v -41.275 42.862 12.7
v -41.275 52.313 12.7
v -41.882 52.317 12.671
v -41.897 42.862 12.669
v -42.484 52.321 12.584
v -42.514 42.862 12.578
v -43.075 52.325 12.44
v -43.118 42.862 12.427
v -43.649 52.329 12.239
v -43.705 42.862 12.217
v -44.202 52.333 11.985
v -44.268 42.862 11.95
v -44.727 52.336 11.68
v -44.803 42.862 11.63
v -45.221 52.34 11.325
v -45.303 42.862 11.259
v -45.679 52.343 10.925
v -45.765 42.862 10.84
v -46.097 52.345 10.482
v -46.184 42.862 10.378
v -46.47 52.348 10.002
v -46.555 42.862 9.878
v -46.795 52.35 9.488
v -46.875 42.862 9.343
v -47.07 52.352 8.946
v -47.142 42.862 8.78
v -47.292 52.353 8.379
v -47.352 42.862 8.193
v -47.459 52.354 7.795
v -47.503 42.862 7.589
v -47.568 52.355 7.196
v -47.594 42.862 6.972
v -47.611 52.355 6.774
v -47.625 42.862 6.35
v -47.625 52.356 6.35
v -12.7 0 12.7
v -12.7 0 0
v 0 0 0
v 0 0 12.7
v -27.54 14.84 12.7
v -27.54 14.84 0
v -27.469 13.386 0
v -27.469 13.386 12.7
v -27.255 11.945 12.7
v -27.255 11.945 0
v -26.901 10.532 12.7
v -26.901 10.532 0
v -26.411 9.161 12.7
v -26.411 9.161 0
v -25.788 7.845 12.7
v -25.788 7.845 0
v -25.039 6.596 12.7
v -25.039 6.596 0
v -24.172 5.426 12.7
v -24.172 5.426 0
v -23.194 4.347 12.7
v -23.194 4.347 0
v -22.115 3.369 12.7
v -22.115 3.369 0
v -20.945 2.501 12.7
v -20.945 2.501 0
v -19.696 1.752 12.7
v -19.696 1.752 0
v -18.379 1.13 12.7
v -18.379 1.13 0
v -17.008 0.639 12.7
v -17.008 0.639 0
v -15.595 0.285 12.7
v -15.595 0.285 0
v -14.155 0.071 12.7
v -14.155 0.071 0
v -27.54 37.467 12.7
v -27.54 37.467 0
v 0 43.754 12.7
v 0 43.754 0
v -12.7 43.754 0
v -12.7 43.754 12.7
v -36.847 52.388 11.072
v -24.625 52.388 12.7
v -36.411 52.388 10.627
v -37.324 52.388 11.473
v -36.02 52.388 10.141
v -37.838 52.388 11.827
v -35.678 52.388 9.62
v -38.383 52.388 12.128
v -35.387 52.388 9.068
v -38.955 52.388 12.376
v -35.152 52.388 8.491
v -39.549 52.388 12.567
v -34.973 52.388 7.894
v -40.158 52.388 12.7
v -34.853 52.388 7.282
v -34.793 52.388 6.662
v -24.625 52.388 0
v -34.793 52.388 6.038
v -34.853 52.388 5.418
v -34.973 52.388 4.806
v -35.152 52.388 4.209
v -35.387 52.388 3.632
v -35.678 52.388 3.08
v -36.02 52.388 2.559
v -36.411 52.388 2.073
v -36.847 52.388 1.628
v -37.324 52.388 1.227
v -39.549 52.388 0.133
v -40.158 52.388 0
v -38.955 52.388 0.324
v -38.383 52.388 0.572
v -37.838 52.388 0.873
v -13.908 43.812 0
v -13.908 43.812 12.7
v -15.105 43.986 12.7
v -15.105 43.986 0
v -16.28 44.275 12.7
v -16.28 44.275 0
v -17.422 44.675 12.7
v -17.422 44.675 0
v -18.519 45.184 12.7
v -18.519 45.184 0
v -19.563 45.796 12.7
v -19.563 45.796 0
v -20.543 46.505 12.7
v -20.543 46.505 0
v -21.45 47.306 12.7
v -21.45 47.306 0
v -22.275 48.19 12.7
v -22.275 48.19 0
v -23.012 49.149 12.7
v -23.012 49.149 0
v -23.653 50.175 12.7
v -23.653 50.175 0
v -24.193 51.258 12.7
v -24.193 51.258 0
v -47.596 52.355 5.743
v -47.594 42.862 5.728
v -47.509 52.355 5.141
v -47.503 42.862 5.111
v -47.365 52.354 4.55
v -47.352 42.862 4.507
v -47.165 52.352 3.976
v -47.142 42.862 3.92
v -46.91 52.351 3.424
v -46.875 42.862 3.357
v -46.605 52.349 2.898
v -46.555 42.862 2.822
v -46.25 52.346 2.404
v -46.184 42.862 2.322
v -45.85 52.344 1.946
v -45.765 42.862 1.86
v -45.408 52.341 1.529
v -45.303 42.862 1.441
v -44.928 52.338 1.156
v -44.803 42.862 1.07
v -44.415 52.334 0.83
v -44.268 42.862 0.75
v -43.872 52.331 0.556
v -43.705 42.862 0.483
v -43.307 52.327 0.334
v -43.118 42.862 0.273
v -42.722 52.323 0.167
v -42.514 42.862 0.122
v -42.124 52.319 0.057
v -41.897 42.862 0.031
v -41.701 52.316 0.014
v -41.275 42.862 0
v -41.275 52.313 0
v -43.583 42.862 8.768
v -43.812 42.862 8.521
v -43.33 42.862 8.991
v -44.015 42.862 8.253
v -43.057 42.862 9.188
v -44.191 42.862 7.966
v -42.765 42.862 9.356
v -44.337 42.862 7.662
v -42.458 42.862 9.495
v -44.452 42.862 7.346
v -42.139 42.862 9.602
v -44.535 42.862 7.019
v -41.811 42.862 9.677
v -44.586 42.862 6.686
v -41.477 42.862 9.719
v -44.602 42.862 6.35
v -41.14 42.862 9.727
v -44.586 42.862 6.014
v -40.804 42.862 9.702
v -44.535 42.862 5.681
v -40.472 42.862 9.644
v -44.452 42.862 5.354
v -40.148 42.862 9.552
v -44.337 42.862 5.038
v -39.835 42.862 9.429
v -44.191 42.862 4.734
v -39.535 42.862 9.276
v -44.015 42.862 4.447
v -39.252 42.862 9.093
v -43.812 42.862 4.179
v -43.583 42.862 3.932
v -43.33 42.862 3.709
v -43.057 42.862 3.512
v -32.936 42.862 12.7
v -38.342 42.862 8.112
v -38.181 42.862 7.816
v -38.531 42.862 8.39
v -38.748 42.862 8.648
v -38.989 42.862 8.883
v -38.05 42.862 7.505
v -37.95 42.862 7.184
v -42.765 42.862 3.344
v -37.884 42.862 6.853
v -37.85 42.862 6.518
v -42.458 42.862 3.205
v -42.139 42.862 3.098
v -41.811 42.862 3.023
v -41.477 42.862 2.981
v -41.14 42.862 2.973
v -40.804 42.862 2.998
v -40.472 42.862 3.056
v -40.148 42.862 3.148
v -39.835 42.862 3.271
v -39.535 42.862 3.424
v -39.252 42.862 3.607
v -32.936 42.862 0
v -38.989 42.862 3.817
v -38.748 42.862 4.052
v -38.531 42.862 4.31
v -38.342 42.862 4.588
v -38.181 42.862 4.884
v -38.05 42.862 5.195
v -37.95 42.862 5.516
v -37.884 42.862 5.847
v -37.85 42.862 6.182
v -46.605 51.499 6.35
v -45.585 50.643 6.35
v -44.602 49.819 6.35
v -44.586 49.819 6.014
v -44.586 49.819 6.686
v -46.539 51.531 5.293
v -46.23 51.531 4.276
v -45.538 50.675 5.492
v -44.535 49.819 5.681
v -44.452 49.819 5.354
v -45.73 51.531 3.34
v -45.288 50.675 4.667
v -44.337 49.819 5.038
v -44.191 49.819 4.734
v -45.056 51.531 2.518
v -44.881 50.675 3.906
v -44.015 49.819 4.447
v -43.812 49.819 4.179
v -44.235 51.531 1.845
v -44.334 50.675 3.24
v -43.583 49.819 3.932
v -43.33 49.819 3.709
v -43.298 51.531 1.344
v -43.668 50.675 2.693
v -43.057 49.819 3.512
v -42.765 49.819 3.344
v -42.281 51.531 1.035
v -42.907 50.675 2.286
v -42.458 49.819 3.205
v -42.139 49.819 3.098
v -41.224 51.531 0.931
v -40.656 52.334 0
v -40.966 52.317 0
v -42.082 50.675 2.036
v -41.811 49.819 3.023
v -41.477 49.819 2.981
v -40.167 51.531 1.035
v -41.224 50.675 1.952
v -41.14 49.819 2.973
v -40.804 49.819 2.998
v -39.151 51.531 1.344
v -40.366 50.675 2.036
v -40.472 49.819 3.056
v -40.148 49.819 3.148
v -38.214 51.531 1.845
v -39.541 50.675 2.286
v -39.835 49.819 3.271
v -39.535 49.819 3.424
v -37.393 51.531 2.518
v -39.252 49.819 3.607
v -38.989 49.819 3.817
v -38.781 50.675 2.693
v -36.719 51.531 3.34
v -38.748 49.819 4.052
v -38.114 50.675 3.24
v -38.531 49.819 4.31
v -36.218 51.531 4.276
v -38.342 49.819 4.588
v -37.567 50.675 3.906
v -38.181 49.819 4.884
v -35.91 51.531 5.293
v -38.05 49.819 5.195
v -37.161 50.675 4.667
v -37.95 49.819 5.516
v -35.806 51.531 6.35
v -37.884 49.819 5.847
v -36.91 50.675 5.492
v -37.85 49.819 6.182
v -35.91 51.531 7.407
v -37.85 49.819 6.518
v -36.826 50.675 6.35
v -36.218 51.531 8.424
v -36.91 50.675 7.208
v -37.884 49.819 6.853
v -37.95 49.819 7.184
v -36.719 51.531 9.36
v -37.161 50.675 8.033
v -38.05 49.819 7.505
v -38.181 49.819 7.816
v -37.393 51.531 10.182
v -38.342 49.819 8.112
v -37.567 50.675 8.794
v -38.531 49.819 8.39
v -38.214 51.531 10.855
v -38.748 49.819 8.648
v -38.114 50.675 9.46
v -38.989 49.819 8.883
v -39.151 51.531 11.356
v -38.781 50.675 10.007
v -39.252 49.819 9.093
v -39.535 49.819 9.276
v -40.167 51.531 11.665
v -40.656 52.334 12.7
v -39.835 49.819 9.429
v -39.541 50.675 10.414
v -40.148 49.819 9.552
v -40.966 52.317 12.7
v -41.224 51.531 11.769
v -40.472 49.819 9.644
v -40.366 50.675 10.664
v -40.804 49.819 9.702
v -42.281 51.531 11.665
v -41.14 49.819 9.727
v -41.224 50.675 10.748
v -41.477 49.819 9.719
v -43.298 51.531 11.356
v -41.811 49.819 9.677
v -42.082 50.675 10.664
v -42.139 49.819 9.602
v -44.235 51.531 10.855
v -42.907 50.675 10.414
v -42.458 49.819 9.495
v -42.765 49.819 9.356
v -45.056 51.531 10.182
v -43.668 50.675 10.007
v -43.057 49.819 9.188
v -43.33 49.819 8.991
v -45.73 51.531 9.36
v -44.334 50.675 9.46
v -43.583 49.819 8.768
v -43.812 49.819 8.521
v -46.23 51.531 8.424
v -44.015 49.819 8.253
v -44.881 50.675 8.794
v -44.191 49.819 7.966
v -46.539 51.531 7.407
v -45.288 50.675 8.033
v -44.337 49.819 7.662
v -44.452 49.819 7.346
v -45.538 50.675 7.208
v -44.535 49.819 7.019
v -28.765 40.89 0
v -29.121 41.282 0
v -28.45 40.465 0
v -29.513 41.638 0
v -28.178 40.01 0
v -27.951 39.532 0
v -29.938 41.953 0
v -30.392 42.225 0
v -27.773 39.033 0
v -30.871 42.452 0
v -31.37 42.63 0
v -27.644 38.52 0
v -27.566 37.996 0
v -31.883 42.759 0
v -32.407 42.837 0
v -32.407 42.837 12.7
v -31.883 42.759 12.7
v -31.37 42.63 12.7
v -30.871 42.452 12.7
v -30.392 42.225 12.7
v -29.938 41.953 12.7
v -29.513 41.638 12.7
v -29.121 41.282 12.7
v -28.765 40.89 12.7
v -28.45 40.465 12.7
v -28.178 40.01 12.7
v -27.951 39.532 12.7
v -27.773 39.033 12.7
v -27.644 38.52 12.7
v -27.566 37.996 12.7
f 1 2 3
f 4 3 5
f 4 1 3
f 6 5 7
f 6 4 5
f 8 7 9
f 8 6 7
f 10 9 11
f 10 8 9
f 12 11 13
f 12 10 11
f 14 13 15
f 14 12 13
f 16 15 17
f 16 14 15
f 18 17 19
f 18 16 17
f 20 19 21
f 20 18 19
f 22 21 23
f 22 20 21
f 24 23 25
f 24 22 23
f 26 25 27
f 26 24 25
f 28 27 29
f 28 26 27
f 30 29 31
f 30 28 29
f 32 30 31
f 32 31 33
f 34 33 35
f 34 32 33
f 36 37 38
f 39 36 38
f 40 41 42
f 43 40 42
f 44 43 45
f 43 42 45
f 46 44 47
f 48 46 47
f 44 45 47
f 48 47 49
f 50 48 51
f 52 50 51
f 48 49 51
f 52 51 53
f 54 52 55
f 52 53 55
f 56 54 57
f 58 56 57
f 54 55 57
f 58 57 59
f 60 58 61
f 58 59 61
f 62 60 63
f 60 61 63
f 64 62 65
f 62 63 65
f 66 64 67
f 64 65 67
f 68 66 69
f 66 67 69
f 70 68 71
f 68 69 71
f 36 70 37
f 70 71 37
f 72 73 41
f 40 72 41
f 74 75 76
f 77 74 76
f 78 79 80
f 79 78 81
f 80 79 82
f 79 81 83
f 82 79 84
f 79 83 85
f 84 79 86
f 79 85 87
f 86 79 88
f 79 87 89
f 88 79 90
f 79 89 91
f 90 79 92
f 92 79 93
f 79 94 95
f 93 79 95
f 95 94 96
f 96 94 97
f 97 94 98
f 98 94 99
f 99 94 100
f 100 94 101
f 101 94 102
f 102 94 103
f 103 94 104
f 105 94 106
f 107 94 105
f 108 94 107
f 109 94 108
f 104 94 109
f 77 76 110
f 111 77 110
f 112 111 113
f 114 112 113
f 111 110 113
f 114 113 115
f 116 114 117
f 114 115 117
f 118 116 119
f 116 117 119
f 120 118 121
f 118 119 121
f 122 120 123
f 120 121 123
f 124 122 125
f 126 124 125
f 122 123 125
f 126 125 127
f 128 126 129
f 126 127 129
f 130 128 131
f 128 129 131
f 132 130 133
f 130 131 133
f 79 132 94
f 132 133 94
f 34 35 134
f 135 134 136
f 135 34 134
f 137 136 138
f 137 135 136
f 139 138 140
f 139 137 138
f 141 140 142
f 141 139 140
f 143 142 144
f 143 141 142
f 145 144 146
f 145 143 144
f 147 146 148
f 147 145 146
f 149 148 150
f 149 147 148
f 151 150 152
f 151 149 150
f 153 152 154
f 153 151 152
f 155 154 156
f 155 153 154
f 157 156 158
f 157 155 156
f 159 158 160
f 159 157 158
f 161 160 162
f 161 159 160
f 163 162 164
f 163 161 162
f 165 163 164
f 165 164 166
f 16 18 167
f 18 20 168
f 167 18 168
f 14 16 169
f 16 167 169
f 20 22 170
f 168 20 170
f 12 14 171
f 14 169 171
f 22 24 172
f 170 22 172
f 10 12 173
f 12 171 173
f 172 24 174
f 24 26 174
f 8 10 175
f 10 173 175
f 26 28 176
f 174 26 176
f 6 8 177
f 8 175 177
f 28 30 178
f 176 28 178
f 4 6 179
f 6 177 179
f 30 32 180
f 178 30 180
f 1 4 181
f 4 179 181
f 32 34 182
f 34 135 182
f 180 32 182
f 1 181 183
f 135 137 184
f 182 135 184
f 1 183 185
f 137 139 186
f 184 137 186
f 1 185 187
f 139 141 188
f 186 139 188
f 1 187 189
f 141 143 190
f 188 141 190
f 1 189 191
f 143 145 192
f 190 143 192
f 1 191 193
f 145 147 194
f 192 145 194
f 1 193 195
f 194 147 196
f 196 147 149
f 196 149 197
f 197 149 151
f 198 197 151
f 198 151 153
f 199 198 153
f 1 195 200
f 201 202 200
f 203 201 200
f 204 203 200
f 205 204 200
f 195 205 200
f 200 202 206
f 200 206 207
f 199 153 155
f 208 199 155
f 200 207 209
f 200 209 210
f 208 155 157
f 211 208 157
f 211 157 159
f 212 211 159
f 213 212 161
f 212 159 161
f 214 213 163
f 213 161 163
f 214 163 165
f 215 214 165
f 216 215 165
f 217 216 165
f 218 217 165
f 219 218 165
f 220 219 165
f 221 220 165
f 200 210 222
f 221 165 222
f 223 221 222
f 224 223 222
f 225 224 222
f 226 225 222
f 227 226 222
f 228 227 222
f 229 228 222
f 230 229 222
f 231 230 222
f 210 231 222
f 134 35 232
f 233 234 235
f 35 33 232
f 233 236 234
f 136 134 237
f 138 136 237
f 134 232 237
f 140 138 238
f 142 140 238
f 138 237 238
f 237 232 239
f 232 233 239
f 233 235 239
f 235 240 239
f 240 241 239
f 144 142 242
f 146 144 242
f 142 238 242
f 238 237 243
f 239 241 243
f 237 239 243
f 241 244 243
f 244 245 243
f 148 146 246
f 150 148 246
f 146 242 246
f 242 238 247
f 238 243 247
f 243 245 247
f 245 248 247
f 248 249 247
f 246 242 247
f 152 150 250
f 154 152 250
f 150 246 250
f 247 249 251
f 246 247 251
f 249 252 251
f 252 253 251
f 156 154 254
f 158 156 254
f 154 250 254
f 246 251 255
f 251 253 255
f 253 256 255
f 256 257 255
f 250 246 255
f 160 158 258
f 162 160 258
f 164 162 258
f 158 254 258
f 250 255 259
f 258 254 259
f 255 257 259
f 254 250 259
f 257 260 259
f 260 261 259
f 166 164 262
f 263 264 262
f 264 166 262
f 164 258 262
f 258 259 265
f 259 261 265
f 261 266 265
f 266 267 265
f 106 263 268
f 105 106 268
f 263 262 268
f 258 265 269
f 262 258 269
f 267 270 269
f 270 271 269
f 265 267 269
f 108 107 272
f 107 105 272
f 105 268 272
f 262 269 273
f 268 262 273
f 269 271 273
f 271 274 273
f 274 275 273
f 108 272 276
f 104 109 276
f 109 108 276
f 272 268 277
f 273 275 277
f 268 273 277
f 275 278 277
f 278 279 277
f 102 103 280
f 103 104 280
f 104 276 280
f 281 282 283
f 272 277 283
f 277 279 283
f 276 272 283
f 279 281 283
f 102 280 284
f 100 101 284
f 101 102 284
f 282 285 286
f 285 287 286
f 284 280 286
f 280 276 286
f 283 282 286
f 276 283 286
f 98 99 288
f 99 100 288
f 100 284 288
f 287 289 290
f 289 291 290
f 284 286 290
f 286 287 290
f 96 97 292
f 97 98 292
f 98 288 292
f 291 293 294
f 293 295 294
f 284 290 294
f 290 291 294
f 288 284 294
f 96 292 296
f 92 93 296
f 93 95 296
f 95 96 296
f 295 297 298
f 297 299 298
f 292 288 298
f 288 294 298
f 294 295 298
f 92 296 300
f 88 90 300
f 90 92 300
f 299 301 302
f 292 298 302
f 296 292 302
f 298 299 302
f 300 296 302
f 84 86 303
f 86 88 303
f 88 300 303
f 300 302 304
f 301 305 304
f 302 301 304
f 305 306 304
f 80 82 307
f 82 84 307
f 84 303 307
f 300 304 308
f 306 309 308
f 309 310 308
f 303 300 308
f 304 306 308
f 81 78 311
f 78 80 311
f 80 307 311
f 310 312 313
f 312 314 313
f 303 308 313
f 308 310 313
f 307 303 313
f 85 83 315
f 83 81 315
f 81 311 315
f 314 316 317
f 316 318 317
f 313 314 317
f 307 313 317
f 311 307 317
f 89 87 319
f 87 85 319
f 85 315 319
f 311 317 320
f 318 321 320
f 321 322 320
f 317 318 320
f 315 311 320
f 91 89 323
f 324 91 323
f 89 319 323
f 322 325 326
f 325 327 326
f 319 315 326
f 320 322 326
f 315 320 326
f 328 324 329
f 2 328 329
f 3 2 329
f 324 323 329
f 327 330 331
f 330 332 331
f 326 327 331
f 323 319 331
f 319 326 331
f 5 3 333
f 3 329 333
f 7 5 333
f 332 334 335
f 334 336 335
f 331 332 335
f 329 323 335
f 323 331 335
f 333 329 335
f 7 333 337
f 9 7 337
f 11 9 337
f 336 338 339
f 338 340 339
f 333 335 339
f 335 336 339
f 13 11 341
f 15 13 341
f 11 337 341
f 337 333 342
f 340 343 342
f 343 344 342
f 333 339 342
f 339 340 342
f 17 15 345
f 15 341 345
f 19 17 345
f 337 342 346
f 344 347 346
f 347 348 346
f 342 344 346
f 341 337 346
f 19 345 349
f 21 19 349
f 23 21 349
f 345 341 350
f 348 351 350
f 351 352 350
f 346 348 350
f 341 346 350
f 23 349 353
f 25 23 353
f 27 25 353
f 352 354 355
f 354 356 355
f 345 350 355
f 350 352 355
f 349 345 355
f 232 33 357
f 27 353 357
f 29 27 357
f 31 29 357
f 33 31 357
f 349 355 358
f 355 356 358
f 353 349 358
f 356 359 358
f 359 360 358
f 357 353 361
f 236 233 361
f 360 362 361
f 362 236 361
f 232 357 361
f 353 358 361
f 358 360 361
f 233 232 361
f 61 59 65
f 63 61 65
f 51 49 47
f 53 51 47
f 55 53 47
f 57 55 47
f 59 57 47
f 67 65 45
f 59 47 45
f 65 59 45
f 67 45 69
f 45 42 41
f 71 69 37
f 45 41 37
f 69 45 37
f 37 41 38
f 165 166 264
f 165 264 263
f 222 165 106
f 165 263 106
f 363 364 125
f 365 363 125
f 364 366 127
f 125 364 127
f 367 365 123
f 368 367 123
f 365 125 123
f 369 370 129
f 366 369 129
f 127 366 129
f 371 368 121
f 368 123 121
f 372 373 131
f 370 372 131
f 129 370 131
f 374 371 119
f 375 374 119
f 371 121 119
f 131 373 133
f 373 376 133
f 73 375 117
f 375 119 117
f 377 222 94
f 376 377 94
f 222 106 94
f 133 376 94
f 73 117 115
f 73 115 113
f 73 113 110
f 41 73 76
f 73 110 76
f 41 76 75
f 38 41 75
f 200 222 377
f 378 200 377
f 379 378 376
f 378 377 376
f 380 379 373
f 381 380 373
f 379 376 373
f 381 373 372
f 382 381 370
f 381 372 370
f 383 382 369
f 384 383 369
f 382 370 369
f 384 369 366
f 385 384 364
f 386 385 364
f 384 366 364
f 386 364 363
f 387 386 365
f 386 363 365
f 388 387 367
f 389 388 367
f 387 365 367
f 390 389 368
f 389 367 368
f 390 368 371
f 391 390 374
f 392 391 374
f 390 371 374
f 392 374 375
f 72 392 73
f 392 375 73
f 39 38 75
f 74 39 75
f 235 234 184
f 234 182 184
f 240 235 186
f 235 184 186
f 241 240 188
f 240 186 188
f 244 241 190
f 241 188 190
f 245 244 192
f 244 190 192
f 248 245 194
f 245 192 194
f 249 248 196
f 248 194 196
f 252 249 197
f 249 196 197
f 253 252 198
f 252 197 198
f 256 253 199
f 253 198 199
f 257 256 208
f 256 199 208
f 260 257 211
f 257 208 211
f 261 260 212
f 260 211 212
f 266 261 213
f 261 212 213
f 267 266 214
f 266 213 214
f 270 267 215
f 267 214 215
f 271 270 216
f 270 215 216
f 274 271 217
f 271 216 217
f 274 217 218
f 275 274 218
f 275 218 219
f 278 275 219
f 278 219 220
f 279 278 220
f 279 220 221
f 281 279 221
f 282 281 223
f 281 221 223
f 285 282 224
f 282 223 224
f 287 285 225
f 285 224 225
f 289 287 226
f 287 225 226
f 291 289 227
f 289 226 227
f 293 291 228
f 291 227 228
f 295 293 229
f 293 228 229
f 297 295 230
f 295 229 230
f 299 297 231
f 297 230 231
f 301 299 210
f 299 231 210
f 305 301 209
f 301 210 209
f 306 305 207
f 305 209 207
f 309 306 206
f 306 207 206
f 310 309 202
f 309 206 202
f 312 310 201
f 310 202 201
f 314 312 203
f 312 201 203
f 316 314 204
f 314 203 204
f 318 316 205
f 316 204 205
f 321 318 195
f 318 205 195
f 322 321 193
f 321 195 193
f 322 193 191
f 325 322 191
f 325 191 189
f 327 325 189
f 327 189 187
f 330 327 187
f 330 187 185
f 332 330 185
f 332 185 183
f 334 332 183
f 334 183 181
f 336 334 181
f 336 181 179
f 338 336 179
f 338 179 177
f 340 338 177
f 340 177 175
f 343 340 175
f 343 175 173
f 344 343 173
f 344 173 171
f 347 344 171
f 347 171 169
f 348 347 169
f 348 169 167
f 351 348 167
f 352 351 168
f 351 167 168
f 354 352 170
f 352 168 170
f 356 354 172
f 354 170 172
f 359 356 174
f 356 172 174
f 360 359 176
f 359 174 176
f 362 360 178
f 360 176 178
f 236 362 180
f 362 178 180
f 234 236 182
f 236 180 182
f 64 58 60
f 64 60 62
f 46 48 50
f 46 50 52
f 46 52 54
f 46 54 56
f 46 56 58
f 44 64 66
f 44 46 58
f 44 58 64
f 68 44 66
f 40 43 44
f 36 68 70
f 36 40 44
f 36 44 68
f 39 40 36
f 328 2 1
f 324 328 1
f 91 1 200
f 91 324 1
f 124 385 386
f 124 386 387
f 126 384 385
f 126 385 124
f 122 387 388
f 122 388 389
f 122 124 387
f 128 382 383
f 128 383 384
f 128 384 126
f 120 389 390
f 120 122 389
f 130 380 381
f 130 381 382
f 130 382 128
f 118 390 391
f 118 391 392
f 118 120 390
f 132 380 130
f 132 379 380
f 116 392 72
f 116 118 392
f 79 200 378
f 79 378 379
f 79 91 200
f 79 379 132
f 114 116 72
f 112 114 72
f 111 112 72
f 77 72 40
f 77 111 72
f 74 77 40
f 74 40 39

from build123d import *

# Parameters (mm, degrees)
BOSS_EXTRUDE1_DEPTH                                 = 12.7
CSK_FOR_1_4_FLAT_HEAD_MACHINE_SCREW_100_D           = 6.7564
CSK_FOR_1_4_FLAT_HEAD_MACHINE_SCREW_100_CSINK_D     = 12.8778
CSK_FOR_1_4_FLAT_HEAD_MACHINE_SCREW_100_CSINK_ANGLE = 100
FILLET1_R                                           = 6.35


with BuildPart() as part:
    # Sketch1 → Boss-Extrude1 (new body)
    with BuildSketch(Plane.XY):
        with BuildLine():
            Line((0, 0), (0, 43.753600343))
            Line((0, 43.753600343), (-12.7, 43.753600343))
            ThreePointArc((-12.7, 43.753600343), (-20.061287028, 46.138664723), (-24.625181908, 52.3875))
            Line((-24.625181908, 52.3875), (-47.625, 52.3875))
            Line((-47.625, 52.3875), (-47.625, 42.8625))
            Line((-47.625, 42.8625), (-32.935820687, 42.8625))
            ThreePointArc((-32.935820687, 42.8625), (-29.120714859, 41.282231424), (-27.540446284, 37.467125597))
            Line((-27.540446284, 37.467125597), (-27.540446284, 14.840446284))
            ThreePointArc((-27.540446284, 14.840446284), (-23.193780203, 4.346666081), (-12.7, 0))
            Line((-12.7, 0), (0, 0))
        make_face()
    extrude(amount=BOSS_EXTRUDE1_DEPTH)

    # CSK for 1/4 Flat Head Machine Screw (100)1 (through all)
    with Locations(Plane(origin=(0, 52.3875, 0), x_dir=(1, 0, 0), z_dir=(0, 1, 0))):
        with Locations((-41.2242, -6.35)):
            CounterSinkHole(CSK_FOR_1_4_FLAT_HEAD_MACHINE_SCREW_100_D / 2, CSK_FOR_1_4_FLAT_HEAD_MACHINE_SCREW_100_CSINK_D / 2, counter_sink_angle=CSK_FOR_1_4_FLAT_HEAD_MACHINE_SCREW_100_CSINK_ANGLE)

    # Fillet1
    fillet1_edges = [part.edges().sort_by_distance(p)[0] for p in [
        (-47.625, 47.625, 0),
        (-47.625, 47.625, 12.7),
    ]]
    fillet(fillet1_edges, radius=FILLET1_R - 0.0001)  # a hair under: the kernel refuses the full size


solid = part.part
